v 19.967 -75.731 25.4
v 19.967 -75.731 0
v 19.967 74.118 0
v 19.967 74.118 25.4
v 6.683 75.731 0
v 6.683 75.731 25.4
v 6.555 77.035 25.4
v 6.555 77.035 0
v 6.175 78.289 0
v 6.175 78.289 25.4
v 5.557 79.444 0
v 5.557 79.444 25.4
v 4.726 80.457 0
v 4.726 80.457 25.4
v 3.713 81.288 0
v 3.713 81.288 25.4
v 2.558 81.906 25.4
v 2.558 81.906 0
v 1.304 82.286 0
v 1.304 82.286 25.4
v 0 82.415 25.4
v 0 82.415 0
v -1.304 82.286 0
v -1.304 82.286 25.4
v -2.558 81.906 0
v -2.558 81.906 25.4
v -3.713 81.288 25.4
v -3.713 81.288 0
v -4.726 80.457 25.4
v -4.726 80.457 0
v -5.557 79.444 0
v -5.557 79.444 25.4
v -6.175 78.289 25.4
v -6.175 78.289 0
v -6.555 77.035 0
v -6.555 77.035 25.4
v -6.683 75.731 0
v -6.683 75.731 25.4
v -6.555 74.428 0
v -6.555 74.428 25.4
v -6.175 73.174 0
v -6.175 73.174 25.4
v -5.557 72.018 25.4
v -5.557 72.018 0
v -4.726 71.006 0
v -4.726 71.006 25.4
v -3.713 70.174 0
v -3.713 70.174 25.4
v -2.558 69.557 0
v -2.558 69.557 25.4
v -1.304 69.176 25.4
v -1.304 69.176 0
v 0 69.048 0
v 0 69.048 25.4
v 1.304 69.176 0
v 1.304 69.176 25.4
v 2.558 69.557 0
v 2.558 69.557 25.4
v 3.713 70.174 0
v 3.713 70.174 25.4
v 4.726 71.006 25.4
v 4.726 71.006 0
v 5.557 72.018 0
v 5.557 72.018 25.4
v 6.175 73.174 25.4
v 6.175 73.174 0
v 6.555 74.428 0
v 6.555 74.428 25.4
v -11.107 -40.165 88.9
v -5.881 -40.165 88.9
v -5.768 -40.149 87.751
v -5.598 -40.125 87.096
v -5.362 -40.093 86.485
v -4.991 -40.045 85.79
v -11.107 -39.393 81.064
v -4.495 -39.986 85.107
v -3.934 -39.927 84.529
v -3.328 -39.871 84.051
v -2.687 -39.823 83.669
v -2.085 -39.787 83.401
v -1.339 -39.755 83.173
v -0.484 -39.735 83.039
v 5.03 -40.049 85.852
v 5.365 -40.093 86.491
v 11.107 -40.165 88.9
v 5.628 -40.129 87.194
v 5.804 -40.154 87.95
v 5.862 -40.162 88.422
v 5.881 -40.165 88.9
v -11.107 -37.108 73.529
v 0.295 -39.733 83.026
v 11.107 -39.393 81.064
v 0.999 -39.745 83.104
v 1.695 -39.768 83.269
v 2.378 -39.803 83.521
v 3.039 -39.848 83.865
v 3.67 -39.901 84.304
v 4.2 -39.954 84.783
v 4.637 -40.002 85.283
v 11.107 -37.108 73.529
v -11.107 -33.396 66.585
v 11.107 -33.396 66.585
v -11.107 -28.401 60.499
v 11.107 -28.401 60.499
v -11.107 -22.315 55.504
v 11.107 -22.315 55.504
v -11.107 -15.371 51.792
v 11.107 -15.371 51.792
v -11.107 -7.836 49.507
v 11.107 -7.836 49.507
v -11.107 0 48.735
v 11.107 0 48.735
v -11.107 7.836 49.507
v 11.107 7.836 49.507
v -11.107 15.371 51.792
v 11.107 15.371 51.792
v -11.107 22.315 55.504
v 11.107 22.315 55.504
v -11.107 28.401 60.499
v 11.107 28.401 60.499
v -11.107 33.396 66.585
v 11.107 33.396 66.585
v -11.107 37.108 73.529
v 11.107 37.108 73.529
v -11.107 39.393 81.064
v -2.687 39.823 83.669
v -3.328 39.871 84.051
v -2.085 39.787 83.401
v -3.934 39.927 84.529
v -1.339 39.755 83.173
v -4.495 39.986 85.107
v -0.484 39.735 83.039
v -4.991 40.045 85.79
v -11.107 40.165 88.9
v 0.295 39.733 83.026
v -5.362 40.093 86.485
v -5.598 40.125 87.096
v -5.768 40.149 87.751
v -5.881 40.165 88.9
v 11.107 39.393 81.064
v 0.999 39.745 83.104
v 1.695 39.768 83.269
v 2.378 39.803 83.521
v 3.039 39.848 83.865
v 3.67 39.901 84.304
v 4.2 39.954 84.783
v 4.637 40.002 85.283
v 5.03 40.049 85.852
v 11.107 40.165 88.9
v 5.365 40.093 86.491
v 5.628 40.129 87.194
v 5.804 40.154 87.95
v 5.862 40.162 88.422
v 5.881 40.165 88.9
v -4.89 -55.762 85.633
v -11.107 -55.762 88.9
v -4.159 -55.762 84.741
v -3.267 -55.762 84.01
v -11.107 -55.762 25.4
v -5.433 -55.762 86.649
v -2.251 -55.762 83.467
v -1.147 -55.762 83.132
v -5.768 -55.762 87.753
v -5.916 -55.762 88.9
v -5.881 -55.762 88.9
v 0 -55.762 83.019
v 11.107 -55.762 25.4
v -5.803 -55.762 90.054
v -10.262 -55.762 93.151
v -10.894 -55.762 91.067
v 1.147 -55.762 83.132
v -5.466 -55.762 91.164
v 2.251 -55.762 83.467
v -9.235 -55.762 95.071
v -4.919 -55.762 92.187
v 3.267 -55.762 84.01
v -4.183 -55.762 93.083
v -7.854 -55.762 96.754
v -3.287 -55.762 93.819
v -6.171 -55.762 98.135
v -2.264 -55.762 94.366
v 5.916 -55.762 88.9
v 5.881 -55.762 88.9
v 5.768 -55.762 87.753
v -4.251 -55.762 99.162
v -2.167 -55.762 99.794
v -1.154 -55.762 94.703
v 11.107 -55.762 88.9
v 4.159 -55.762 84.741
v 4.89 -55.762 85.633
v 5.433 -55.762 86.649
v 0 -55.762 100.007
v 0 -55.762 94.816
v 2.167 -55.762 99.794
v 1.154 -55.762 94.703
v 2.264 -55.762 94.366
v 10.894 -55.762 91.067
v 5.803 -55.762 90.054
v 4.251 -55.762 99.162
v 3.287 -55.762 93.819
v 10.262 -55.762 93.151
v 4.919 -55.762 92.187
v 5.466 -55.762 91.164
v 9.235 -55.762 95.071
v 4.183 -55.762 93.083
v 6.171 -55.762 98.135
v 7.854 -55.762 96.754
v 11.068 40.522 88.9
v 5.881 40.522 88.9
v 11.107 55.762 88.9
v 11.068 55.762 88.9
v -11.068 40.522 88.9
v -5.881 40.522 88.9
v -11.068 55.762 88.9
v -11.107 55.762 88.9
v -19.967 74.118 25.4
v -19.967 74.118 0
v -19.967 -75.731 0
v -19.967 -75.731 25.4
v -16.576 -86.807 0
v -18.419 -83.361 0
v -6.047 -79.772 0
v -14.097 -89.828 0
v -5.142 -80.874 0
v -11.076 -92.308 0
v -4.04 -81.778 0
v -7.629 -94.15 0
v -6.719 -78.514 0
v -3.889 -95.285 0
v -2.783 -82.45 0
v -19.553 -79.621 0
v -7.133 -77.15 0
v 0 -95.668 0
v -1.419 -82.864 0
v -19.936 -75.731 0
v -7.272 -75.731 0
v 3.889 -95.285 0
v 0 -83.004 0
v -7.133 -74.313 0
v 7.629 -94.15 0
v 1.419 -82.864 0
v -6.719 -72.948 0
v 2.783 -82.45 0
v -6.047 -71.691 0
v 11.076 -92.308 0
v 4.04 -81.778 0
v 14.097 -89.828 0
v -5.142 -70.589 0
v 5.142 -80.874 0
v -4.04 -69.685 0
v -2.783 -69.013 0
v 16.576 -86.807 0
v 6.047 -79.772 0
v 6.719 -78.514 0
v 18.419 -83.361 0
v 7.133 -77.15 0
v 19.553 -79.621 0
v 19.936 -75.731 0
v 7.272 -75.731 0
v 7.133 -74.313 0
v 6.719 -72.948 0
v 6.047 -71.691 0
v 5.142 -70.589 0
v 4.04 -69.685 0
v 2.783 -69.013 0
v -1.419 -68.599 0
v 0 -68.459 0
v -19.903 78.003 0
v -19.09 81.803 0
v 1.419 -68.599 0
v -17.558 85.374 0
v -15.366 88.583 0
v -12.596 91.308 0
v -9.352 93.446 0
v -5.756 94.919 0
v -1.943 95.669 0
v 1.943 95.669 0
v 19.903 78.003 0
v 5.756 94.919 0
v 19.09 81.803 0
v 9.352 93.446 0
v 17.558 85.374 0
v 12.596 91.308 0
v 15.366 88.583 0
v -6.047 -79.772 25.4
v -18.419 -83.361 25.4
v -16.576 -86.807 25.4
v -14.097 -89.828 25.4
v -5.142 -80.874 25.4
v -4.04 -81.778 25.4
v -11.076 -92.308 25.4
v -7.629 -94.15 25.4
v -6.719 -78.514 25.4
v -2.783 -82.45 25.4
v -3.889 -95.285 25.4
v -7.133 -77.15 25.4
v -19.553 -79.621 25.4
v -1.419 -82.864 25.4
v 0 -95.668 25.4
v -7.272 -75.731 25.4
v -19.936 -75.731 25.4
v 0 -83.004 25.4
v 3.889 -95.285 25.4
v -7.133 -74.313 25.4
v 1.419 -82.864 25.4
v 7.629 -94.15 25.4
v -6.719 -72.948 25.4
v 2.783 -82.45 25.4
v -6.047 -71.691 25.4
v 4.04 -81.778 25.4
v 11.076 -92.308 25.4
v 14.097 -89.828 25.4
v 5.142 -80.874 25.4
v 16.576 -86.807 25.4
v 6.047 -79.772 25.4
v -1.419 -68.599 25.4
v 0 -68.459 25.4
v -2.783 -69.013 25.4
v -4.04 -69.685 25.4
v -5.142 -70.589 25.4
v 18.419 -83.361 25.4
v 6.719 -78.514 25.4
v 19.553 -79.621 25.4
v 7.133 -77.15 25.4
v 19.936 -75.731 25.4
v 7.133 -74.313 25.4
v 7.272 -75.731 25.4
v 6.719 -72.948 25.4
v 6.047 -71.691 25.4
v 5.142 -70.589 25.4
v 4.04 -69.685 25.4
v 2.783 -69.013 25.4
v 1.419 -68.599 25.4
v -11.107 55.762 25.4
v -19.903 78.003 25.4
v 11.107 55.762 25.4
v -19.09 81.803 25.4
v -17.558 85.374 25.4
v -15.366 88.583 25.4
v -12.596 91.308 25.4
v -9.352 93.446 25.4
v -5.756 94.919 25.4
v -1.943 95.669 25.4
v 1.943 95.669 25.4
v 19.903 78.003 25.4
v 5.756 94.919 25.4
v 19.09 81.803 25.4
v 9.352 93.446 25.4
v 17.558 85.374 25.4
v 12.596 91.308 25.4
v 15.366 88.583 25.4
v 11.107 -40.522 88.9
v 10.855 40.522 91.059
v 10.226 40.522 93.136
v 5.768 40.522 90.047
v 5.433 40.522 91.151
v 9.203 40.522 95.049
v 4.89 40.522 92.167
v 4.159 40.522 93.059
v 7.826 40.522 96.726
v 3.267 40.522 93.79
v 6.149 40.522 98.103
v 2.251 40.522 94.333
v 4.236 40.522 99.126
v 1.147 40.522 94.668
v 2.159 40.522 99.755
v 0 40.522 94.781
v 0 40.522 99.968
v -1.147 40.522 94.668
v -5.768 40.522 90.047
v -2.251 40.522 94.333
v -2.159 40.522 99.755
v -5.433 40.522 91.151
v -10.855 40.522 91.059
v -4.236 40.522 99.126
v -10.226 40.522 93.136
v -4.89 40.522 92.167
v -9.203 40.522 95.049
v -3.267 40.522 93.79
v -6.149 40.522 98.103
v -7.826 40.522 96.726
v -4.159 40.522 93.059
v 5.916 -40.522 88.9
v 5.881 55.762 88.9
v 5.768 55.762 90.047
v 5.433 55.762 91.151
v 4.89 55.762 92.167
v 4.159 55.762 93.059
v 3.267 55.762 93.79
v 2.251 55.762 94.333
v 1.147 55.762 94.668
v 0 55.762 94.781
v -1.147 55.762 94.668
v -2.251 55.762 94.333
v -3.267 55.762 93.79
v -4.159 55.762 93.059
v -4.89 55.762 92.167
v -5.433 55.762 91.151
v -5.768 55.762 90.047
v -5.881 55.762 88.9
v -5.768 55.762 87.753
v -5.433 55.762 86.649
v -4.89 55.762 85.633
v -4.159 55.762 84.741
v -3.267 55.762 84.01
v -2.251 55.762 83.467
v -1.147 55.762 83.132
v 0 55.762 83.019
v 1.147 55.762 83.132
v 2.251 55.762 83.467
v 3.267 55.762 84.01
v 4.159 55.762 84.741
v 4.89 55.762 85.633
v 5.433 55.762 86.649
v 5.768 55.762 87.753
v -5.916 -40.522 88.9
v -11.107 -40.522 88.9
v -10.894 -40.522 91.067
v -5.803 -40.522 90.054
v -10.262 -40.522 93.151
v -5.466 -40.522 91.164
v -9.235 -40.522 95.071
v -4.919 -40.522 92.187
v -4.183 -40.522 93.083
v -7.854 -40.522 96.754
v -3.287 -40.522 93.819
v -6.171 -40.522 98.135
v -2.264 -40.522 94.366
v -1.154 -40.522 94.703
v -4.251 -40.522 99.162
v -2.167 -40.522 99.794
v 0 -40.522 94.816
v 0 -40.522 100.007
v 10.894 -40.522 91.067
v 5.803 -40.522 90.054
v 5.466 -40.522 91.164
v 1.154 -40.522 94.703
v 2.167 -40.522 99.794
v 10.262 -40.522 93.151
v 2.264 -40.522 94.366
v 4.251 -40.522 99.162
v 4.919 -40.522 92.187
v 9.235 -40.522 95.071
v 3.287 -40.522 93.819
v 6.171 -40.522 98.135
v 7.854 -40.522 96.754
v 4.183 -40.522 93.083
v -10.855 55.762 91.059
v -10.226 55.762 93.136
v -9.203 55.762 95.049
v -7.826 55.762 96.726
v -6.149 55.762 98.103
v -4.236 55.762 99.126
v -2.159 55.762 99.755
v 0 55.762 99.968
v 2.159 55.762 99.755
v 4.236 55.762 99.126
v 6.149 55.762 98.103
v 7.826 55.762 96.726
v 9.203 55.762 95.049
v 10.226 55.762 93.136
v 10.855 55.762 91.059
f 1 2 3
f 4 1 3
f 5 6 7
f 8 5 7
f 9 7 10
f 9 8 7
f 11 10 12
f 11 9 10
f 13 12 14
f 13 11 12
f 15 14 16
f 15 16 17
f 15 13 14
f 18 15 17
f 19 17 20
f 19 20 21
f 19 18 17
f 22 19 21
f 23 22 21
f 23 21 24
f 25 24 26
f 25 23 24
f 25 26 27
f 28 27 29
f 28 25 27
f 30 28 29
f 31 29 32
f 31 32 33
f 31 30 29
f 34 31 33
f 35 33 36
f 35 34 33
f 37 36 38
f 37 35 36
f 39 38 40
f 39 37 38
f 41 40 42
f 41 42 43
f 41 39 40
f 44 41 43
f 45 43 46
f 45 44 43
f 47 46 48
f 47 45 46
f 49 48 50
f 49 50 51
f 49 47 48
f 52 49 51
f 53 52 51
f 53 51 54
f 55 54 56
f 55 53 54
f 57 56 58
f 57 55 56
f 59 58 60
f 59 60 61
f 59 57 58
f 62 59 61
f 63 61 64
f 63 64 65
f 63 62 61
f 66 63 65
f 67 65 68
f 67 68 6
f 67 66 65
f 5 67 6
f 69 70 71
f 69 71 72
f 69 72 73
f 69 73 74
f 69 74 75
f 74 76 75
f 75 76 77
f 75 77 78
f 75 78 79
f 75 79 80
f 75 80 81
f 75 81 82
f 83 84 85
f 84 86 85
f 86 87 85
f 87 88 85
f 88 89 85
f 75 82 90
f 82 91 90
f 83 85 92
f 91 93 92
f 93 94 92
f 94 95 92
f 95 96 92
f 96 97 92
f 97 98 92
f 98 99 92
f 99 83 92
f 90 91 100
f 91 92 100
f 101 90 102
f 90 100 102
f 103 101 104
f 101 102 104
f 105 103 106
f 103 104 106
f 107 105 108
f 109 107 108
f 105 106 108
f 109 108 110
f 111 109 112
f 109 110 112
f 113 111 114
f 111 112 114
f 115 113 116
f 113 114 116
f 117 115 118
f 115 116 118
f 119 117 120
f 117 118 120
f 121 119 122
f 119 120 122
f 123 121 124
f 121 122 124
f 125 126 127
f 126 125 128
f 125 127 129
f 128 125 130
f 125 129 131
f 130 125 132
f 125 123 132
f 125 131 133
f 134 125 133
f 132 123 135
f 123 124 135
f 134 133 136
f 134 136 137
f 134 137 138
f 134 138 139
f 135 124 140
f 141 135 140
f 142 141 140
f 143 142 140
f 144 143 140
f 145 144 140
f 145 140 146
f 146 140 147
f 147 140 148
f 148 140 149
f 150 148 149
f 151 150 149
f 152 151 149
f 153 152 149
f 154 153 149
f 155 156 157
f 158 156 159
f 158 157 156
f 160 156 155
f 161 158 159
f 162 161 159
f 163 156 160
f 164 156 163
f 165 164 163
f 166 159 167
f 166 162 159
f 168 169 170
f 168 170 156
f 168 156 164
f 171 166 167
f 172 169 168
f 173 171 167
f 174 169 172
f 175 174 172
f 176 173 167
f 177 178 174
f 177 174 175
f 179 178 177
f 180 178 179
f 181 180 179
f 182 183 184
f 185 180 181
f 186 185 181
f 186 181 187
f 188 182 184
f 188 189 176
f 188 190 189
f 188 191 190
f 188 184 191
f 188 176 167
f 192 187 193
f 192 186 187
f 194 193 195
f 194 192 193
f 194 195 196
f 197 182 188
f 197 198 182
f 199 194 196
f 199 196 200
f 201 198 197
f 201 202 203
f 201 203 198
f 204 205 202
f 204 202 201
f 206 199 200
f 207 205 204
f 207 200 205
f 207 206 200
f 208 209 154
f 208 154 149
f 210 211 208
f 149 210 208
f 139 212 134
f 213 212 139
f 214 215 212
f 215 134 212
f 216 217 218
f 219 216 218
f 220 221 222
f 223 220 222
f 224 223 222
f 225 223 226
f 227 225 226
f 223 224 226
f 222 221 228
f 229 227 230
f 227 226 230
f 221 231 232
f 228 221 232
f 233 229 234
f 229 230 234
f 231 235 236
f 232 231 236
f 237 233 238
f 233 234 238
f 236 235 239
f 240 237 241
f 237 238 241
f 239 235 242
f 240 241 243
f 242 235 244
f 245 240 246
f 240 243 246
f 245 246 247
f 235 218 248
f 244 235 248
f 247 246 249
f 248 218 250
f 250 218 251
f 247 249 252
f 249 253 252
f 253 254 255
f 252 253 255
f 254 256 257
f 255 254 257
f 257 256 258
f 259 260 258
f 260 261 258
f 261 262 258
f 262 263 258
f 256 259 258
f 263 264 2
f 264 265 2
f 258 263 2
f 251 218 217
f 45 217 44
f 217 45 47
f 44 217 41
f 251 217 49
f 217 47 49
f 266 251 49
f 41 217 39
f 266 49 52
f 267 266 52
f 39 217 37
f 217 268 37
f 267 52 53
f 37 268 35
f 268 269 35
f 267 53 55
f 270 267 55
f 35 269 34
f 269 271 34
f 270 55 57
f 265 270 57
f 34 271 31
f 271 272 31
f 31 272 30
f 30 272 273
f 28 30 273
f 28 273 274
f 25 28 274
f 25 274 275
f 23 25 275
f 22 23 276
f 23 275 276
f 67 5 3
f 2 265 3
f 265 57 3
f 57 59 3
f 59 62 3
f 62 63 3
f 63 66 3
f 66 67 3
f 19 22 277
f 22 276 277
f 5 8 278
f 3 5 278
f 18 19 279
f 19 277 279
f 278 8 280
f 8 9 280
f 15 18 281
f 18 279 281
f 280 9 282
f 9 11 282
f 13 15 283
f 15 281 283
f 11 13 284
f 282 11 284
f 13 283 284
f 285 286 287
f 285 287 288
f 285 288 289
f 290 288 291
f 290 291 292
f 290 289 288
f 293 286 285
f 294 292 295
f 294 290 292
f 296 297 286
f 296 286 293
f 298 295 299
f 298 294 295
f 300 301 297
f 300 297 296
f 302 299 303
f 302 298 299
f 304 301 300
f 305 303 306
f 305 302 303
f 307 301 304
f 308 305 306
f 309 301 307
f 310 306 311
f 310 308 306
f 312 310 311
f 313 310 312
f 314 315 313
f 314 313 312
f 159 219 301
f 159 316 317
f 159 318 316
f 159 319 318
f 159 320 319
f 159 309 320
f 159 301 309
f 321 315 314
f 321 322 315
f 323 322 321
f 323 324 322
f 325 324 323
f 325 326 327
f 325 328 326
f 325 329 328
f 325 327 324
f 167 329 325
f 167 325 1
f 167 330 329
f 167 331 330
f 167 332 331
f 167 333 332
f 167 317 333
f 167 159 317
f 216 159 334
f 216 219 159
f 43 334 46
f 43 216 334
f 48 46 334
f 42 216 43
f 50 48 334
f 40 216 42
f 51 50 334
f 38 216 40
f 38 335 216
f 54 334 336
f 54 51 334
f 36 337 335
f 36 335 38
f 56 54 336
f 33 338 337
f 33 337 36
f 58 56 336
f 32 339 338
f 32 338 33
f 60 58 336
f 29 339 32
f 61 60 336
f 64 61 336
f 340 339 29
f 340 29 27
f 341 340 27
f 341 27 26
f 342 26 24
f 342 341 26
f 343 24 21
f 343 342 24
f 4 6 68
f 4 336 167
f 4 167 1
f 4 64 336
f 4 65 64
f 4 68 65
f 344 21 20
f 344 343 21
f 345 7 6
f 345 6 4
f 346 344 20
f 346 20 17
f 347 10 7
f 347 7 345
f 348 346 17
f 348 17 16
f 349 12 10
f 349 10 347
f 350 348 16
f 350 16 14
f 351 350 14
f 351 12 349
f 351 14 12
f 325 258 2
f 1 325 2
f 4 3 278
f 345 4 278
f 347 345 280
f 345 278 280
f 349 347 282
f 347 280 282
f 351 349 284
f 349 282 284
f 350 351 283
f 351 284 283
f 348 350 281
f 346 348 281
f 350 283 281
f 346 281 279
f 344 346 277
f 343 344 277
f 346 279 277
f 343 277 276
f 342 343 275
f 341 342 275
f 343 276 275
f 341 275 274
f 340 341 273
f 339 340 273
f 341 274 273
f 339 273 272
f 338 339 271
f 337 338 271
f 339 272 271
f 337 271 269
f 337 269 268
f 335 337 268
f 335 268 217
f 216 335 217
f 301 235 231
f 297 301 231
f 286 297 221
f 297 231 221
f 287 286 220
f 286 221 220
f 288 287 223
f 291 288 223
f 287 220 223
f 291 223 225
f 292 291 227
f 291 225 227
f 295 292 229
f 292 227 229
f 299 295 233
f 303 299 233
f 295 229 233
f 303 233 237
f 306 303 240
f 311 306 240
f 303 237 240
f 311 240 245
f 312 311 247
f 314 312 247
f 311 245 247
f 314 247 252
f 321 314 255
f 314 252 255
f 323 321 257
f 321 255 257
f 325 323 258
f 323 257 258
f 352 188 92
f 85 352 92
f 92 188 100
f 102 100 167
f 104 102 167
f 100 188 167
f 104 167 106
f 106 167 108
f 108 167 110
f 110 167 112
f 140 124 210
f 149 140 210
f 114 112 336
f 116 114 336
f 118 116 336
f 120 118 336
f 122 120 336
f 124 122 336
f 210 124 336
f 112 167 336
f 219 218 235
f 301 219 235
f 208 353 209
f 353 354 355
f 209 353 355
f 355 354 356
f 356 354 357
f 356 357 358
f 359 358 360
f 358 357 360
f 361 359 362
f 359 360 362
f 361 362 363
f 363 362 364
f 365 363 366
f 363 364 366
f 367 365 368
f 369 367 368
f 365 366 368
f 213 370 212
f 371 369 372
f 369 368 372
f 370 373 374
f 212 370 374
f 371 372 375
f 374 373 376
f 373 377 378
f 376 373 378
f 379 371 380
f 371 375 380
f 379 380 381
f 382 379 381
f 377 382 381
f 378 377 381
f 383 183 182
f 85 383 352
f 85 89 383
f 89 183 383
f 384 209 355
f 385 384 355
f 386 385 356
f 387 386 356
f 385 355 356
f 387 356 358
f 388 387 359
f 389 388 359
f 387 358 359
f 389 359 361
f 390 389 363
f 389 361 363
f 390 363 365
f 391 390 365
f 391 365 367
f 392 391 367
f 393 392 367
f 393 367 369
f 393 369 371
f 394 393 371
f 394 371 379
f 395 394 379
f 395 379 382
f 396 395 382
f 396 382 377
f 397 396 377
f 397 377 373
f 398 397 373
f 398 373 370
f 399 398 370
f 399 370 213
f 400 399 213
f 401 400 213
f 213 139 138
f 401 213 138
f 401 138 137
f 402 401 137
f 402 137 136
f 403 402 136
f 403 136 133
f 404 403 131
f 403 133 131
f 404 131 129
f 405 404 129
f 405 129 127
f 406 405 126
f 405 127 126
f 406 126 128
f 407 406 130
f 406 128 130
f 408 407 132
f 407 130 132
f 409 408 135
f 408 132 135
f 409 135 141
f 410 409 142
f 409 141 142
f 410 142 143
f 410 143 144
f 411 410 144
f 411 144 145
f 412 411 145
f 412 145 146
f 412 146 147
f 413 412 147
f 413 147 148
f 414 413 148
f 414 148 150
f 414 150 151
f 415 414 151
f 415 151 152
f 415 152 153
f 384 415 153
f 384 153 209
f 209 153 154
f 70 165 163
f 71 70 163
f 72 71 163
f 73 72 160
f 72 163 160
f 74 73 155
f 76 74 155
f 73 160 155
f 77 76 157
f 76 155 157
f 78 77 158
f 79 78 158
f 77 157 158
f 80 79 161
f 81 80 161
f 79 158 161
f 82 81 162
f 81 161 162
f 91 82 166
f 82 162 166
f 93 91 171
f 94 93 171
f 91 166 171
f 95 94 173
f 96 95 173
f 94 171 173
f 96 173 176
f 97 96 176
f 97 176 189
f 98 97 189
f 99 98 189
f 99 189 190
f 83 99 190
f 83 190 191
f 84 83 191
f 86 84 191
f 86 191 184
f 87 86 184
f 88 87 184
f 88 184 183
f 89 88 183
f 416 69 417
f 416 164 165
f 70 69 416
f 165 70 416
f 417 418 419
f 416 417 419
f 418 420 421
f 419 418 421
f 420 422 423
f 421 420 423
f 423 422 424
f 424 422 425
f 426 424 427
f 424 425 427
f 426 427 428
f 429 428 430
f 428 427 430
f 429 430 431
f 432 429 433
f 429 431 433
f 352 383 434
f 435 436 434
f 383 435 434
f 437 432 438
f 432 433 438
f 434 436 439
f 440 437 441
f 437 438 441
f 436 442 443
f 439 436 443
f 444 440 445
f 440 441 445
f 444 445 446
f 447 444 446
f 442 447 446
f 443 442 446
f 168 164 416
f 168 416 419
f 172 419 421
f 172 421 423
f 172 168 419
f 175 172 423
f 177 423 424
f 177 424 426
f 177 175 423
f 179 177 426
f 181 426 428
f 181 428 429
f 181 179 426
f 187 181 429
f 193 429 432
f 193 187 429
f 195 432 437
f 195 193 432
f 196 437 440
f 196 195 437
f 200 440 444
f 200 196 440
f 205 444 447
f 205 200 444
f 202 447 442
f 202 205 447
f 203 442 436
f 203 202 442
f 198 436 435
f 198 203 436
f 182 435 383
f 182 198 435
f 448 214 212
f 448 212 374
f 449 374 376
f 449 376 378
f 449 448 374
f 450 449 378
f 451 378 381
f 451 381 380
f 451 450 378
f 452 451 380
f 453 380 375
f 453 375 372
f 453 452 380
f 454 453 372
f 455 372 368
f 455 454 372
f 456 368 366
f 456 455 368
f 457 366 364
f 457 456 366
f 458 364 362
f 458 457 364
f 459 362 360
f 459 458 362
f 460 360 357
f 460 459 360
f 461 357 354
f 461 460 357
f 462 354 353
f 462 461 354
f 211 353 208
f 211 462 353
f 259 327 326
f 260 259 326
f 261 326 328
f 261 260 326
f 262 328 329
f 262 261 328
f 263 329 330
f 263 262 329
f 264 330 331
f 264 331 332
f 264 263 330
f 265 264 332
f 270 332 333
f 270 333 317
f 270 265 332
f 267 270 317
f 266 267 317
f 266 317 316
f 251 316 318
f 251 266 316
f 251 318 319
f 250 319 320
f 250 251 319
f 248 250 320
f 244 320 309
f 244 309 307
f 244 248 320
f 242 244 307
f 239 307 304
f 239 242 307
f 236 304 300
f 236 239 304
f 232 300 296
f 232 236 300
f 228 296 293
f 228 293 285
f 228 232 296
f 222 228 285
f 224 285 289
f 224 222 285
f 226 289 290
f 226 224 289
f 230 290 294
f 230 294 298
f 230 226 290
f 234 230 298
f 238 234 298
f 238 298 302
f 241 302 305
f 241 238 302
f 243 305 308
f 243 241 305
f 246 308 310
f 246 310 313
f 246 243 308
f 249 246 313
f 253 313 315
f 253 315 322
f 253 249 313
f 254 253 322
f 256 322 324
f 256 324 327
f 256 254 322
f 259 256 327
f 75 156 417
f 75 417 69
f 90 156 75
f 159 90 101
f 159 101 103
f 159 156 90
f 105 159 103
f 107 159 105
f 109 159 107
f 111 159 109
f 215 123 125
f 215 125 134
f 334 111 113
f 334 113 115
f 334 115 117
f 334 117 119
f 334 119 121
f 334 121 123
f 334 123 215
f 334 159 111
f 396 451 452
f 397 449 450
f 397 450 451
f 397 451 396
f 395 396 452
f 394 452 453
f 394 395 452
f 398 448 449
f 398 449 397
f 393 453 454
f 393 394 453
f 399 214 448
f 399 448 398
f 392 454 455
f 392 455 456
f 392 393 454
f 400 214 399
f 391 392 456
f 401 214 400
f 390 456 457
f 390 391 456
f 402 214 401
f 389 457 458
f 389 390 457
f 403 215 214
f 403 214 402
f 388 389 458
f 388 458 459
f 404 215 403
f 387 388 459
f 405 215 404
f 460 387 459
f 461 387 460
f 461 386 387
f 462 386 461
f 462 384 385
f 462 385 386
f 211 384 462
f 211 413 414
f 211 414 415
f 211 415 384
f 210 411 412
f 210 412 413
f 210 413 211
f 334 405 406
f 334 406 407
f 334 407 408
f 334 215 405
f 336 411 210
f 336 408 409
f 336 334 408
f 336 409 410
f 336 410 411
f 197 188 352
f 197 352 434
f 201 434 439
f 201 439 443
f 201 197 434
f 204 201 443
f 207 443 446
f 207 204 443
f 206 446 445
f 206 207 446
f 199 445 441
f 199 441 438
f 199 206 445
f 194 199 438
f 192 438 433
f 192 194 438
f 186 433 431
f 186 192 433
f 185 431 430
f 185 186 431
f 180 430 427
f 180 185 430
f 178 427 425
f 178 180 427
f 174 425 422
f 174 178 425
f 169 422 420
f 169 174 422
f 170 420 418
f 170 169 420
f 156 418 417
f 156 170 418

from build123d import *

# Parameters (mm, degrees)
F0_R      = 7.272235
F0_R_2    = 6.683406
F1_DEPTH  = 25.4
F2_W      = 22.214184
F2_H      = 111.52488
F3_DEPTH  = 63.5
F5_DEPTH  = 31.140026
F7_DEPTH  = 15.24
F9_DEPTH  = 15.24
F10_R     = 5.88112
F11_DEPTH = 151.526764


with BuildPart() as f1:
    # F0 (on Top) → F1 (new body)
    with BuildSketch(Plane.XY):
        with BuildLine():
            Line((-19.966846, 74.117869), (-19.966846, -75.731389))
            Line((-19.966846, -75.731389), (-19.936258, -75.731389))
            ThreePointArc((-19.936258, -75.731389), (0, -95.667647), (19.936258, -75.731389))
            Line((19.936258, -75.731389), (19.966846, -75.731389))
            Line((19.966846, -75.731389), (19.966846, 74.117869))
            ThreePointArc((19.966846, 74.117869), (0, 95.763324), (-19.966846, 74.117869))
        make_face()
        with Locations((0, -75.731389)):
            Circle(F0_R, mode=Mode.SUBTRACT)
        with Locations((0, 75.731389)):
            Circle(F0_R_2, mode=Mode.SUBTRACT)
    extrude(amount=F1_DEPTH)

    # F2 (on face) → F3 (join)
    with BuildSketch(Plane.XY.offset(25.4)):
        Rectangle(F2_W, F2_H)
    extrude(amount=F3_DEPTH)

    # F4 (on face) → F5 (cut, through all)
    with BuildSketch(Plane.YZ.offset(11.107092)):
        with BuildLine():
            Line((40.165234, 88.9), (-40.165234, 88.9))
            ThreePointArc((-40.165234, 88.9), (0, 48.734766), (40.165234, 88.9))
        make_face()
    extrude(amount=-F5_DEPTH, mode=Mode.SUBTRACT)

    # F6 (on face) → F7 (join)
    with BuildSketch(Plane.XZ.offset(55.76244)):
        with BuildLine():
            Line((5.916213, 88.9), (11.107092, 88.9))
            ThreePointArc((11.107092, 88.9), (0, 100.007092), (-11.107092, 88.9))
            Line((-11.107092, 88.9), (-5.916213, 88.9))
            ThreePointArc((-5.916213, 88.9), (0, 94.816213), (5.916213, 88.9))
        make_face()
    extrude(amount=-F7_DEPTH)

    # F8 (on face) → F9 (join)
    with BuildSketch(Plane(origin=(0, 55.76244, 0), x_dir=(-1, 0, 0), z_dir=(0, 1, 0))):
        with BuildLine():
            Line((-11.068059, 88.9), (11.068059, 88.9))
            ThreePointArc((11.068059, 88.9), (0, 99.968059), (-11.068059, 88.9))
        make_face()
    extrude(amount=-F9_DEPTH)

    # F10 (on face) → F11 (cut, through all)
    with BuildSketch(Plane.XZ.offset(55.76244)):
        with Locations((0, 88.9)):
            Circle(F10_R)
    extrude(amount=-F11_DEPTH, mode=Mode.SUBTRACT)


solid = f1.part
